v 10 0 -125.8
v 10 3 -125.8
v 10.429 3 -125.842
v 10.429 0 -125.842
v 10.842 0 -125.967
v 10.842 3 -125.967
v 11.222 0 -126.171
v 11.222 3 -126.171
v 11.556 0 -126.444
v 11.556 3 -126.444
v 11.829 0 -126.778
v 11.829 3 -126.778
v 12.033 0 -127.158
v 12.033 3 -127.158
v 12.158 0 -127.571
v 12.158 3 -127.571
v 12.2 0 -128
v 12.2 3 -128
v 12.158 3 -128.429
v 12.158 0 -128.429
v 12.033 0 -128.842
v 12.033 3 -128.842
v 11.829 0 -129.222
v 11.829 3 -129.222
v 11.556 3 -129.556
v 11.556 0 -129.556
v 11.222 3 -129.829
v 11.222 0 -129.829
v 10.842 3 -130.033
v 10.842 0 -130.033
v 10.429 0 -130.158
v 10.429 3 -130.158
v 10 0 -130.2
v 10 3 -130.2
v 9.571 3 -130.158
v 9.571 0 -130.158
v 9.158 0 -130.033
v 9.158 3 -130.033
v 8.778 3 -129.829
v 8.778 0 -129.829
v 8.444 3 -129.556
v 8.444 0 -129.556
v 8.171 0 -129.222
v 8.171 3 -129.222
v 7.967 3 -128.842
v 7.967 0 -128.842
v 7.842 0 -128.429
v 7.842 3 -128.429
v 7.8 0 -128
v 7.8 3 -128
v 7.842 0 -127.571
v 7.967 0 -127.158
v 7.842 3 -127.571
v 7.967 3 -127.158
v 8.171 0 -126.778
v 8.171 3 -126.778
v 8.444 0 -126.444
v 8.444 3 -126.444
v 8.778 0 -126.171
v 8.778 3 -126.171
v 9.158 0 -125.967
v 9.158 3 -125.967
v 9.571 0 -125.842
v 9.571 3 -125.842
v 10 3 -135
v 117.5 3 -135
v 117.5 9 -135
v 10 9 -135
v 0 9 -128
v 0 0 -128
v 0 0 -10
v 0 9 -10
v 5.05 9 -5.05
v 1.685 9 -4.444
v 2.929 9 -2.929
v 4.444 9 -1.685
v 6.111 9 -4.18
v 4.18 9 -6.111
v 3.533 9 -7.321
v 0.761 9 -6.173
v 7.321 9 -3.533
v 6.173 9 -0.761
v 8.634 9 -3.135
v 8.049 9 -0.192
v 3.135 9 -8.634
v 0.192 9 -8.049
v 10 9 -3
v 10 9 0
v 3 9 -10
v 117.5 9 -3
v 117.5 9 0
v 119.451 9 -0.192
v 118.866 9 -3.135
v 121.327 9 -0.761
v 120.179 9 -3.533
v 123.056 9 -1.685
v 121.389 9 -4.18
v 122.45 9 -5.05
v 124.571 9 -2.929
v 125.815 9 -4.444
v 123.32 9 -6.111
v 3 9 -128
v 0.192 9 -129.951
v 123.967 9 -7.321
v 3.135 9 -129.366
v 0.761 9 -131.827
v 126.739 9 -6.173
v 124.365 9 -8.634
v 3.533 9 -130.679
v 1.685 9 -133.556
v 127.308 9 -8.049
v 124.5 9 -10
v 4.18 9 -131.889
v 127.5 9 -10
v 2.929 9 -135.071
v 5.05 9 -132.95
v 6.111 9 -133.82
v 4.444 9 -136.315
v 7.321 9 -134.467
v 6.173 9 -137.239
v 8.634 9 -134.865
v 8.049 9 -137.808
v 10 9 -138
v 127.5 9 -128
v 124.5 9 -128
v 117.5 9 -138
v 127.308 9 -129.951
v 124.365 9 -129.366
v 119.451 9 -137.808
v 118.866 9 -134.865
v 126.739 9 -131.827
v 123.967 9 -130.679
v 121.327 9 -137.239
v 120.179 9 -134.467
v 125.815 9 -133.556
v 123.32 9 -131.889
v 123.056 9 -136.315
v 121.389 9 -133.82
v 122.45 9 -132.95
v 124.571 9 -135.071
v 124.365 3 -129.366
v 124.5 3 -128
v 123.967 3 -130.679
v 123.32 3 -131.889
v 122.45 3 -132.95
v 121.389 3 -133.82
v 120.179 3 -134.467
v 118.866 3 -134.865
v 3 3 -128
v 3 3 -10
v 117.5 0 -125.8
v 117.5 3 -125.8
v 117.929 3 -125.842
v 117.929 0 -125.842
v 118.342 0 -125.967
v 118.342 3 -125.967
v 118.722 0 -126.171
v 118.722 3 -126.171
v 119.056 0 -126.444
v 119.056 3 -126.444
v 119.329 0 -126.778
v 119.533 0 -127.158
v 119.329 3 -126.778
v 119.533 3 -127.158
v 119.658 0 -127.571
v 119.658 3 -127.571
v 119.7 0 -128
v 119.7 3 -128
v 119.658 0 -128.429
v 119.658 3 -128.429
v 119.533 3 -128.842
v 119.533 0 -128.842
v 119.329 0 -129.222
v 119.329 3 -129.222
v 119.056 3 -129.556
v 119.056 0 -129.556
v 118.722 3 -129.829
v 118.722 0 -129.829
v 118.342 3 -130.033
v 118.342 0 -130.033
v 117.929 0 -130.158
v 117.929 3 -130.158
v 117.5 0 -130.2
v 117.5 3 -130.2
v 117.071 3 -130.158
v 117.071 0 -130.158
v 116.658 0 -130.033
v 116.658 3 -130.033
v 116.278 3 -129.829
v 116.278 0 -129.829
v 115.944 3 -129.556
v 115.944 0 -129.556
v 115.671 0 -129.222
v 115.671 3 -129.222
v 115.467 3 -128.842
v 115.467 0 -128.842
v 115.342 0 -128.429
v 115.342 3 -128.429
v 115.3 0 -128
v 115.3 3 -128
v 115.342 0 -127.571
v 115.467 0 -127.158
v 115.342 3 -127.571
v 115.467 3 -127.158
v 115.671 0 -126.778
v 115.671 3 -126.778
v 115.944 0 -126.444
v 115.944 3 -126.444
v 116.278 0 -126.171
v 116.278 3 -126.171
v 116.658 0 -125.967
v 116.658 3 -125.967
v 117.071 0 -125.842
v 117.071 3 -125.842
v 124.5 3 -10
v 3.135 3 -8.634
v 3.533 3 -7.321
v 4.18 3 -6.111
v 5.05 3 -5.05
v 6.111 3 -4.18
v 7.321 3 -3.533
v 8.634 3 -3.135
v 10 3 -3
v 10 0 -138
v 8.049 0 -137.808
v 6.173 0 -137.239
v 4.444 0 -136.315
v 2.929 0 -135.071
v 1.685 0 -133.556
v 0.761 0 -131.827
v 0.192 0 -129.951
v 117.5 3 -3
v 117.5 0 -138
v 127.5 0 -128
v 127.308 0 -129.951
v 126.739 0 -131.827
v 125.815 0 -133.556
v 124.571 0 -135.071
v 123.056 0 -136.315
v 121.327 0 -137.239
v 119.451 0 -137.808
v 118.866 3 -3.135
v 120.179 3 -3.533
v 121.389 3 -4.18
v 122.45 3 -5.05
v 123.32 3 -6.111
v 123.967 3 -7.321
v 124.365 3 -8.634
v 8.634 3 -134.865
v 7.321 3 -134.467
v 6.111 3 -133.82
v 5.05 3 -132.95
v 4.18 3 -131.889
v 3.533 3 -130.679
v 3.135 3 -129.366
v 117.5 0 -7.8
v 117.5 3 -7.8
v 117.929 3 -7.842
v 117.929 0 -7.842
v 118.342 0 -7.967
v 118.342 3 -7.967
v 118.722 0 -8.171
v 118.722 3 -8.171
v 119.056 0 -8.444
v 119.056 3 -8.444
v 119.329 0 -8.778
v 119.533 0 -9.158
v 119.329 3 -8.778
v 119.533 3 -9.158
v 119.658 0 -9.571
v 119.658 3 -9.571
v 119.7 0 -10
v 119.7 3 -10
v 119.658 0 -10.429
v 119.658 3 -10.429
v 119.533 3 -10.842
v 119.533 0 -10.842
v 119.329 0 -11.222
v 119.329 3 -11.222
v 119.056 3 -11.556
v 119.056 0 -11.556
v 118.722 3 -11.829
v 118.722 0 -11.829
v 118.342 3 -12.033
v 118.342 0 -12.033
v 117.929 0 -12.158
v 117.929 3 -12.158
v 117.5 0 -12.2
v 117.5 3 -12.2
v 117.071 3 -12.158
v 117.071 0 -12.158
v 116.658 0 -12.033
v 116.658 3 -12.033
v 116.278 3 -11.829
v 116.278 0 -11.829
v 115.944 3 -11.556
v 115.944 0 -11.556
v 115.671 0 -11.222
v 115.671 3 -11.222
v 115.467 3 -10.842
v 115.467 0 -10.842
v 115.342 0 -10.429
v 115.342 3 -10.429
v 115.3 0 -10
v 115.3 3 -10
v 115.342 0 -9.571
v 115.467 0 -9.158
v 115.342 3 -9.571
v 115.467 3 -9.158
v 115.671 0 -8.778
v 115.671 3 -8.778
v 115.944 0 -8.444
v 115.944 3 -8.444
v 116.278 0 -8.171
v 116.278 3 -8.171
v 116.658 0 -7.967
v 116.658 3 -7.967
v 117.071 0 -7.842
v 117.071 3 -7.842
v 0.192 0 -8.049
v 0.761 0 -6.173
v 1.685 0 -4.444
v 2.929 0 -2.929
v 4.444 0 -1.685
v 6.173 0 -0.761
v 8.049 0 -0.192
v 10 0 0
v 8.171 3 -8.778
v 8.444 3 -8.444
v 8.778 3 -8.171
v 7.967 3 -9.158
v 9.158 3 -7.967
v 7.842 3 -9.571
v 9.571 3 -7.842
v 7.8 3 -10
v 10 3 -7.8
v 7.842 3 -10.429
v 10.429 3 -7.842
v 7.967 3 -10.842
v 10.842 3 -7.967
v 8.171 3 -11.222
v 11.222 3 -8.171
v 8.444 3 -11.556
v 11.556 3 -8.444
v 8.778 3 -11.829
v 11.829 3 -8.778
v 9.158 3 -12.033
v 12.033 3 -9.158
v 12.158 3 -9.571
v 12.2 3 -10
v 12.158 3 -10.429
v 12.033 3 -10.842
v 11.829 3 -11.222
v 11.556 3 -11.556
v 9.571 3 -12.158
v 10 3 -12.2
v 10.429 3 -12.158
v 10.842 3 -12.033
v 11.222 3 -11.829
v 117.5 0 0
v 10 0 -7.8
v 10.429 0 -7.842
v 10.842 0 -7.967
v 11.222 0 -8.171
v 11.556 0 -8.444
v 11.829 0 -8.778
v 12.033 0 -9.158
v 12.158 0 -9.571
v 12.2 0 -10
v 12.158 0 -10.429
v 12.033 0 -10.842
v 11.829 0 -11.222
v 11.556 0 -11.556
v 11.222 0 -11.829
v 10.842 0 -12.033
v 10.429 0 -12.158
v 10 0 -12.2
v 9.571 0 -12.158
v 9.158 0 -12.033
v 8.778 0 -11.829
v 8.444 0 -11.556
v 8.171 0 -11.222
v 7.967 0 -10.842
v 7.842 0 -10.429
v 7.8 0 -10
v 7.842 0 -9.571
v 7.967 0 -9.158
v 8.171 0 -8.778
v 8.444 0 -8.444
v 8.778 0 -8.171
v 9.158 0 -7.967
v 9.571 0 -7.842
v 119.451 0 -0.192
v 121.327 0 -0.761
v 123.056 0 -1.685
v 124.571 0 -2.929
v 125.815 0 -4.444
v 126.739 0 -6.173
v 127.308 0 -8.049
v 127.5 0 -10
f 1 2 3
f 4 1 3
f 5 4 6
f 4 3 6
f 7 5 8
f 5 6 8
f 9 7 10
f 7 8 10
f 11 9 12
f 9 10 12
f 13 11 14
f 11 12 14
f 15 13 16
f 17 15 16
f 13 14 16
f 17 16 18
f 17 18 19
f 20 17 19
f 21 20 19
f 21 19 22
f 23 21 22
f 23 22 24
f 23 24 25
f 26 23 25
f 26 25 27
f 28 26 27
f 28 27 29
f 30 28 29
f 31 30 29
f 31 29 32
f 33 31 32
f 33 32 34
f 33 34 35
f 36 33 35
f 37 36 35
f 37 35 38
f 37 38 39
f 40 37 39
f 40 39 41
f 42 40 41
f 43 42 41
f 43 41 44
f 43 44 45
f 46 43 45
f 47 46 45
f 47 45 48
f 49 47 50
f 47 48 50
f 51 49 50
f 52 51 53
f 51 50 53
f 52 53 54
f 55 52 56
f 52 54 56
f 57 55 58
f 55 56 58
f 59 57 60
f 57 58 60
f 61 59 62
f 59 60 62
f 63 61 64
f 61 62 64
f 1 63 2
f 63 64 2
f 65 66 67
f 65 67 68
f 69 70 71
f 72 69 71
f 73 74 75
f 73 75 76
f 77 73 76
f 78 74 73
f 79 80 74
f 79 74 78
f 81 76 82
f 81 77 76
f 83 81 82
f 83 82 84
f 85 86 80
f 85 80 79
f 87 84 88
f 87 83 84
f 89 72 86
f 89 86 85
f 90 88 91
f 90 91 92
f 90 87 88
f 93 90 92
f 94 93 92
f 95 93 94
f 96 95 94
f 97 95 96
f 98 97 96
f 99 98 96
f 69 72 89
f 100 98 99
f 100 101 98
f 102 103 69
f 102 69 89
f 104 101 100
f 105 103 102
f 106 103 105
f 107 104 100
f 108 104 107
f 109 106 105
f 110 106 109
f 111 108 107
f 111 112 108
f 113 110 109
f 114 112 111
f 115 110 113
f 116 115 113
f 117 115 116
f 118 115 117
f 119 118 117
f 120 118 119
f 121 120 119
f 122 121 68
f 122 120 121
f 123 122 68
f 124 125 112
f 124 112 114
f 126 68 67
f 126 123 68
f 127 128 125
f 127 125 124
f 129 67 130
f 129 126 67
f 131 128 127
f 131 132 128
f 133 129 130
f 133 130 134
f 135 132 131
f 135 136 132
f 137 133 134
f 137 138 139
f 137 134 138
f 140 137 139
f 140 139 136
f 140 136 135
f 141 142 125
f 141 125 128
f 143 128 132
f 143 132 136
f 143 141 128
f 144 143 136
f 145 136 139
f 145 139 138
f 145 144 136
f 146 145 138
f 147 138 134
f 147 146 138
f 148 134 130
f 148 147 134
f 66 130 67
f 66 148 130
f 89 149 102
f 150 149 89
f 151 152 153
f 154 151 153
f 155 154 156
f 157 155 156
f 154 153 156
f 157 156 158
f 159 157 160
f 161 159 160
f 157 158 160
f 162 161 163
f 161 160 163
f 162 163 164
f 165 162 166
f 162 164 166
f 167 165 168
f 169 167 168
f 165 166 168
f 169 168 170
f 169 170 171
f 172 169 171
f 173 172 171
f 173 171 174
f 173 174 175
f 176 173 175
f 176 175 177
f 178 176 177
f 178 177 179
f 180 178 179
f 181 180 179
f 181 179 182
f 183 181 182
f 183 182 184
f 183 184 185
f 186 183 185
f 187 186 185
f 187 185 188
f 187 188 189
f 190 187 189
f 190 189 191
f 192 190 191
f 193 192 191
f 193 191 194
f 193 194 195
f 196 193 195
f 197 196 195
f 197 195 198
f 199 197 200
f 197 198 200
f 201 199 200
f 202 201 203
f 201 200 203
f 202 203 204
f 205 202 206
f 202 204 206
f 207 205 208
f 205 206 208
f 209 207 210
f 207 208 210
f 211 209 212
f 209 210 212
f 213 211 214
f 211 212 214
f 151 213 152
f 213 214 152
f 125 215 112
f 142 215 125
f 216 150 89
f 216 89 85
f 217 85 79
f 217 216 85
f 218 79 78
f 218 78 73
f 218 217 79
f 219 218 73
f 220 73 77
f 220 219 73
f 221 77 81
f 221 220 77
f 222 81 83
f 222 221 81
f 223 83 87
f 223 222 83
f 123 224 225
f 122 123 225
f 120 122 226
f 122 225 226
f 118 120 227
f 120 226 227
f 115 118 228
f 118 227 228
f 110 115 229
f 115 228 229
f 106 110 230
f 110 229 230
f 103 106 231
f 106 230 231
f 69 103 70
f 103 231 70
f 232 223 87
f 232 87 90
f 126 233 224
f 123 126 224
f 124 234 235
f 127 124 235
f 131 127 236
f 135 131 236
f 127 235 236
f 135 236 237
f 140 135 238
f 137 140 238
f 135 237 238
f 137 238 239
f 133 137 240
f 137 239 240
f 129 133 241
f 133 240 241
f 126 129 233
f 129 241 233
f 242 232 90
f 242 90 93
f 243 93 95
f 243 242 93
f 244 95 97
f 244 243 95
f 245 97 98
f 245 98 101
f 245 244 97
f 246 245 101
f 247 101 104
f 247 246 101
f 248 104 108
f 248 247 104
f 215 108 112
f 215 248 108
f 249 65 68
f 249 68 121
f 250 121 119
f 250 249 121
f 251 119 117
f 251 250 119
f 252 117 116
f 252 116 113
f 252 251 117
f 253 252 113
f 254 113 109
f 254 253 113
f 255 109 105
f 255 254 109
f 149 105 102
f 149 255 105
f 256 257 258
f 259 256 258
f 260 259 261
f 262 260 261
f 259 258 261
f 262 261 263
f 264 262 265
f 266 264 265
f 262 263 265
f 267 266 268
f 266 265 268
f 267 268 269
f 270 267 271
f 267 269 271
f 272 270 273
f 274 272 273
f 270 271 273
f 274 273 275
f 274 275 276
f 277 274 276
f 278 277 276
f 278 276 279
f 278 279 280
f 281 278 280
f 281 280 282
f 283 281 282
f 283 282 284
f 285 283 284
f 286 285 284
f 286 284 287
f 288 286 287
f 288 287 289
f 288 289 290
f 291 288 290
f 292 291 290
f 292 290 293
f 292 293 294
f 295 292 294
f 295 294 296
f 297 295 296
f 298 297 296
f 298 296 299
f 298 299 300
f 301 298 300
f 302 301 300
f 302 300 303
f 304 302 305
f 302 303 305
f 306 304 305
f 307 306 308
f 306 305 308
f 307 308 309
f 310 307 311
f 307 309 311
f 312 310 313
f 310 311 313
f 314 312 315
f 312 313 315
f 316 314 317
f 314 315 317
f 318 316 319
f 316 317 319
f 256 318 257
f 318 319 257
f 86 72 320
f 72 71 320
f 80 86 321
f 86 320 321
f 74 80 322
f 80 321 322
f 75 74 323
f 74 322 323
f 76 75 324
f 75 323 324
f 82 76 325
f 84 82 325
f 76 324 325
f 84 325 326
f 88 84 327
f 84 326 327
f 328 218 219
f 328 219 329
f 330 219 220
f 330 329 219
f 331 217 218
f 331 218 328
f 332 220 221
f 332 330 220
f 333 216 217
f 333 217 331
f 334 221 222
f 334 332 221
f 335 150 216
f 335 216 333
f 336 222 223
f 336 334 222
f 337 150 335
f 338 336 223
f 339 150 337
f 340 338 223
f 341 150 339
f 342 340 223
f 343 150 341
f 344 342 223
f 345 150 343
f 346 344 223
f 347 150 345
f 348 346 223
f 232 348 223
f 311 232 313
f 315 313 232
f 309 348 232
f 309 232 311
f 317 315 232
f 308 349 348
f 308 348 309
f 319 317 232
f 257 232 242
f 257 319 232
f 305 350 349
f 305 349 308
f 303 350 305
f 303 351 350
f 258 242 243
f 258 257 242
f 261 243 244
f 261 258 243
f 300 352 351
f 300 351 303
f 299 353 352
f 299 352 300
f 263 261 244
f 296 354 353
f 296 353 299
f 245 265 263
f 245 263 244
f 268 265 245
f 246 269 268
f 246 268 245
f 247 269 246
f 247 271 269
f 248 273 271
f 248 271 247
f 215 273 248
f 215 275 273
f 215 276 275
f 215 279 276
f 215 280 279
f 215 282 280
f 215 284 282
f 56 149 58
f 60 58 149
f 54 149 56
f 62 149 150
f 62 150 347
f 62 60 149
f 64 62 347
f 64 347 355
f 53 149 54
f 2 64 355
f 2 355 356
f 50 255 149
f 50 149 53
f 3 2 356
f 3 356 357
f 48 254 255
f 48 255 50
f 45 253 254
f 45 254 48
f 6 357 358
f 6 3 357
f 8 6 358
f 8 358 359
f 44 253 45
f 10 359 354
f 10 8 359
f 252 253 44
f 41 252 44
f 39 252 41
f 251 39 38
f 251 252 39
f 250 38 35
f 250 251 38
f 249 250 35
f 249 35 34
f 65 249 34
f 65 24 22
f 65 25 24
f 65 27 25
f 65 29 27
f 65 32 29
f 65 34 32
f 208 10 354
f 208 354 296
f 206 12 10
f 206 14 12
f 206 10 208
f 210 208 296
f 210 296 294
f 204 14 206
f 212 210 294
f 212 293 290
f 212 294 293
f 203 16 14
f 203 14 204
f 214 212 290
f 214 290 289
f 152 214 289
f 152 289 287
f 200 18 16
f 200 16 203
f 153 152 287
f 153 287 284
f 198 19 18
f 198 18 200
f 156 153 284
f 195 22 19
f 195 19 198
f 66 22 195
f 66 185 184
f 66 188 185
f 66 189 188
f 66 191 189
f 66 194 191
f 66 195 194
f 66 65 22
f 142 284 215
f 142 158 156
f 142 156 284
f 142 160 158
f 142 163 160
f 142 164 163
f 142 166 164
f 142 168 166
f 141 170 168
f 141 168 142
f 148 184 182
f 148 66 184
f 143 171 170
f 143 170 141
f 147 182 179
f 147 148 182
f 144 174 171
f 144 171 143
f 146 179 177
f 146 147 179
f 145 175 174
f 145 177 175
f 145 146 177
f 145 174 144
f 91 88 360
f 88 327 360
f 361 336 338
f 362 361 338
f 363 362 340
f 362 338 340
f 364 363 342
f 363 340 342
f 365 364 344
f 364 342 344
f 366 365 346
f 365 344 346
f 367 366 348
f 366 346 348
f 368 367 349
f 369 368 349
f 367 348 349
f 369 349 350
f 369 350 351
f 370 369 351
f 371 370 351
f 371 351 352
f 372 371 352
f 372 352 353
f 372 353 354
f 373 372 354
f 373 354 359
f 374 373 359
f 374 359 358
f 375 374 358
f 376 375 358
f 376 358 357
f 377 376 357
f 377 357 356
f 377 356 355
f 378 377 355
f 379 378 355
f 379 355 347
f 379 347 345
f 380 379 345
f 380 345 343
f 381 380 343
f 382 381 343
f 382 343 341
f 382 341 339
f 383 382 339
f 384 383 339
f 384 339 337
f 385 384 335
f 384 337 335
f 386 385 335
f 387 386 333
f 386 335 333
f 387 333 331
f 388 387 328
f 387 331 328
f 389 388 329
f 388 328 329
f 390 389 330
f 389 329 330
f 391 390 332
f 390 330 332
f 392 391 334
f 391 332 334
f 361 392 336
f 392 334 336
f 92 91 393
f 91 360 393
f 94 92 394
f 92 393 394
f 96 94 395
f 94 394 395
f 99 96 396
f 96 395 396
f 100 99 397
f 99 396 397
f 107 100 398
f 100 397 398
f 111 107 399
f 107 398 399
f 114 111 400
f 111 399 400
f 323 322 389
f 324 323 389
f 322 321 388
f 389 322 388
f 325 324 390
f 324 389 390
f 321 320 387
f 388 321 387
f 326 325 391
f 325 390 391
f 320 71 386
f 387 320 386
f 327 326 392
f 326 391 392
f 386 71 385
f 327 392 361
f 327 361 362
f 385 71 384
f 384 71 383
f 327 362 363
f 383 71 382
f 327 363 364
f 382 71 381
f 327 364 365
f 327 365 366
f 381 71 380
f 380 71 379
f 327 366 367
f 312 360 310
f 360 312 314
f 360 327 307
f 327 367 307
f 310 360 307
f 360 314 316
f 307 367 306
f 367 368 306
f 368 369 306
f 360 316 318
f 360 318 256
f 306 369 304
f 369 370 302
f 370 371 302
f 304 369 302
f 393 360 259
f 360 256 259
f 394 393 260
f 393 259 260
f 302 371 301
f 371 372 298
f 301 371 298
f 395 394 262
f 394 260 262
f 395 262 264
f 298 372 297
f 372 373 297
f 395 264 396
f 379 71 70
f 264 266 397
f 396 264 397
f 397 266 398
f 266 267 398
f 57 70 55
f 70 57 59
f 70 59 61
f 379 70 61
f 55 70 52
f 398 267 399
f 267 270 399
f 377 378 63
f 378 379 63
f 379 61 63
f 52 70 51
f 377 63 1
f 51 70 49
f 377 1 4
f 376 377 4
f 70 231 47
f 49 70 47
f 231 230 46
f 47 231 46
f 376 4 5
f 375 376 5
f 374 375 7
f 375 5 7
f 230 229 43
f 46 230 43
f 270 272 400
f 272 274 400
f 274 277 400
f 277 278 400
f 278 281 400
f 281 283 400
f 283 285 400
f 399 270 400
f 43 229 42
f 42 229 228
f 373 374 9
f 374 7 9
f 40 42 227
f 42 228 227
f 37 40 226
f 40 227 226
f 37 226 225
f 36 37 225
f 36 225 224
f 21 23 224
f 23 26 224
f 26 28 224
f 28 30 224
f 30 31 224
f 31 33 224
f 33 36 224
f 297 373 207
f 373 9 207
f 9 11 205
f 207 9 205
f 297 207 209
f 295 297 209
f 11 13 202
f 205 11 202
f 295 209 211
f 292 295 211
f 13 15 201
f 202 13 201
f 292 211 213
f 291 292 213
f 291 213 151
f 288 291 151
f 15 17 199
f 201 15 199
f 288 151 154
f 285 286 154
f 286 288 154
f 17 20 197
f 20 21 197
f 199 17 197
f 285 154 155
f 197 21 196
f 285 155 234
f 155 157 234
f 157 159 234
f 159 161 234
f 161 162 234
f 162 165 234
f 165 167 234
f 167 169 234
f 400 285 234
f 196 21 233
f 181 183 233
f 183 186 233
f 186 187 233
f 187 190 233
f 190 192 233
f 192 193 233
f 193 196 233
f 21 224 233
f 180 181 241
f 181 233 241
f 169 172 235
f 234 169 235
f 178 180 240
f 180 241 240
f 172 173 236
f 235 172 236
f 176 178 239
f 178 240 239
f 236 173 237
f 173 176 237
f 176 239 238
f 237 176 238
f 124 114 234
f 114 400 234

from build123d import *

# Parameters (mm, degrees)
EXTRUDE_1_DEPTH     = 3
EXTRUDE_2_DEPTH     = 6
SKETCH_3_R          = 2.2
CUT_EXTRUDE_1_DEPTH = 188.979387168


with BuildPart() as part:
    # 草图1 → 凸台-拉伸1 (new body)
    with BuildSketch(Plane(origin=(0, 0, 0), x_dir=(1, 0, 0), z_dir=(0, 1, 0))):
        with BuildLine():
            Line((10, 0), (117.5, 0))
            ThreePointArc((117.5, 0), (124.571067812, 2.928932188), (127.5, 10))
            Line((127.5, 10), (127.5, 128))
            ThreePointArc((127.5, 128), (124.571067812, 135.071067812), (117.5, 138))
            Line((117.5, 138), (10, 138))
            ThreePointArc((10, 138), (2.928932188, 135.071067812), (0, 128))
            Line((0, 128), (0, 10))
            ThreePointArc((0, 10), (2.928932188, 2.928932188), (10, 0))
        make_face()
    extrude(amount=EXTRUDE_1_DEPTH)

    # 草图2 → 凸台-拉伸2 (add)
    with BuildSketch(Plane(origin=(0, 3, 0), x_dir=(1, 0, 0), z_dir=(0, 1, 0))):
        with BuildLine():
            Line((0, 128), (0, 10))
            ThreePointArc((0, 10), (2.928932188, 2.928932188), (10, 0))
            Line((10, 0), (117.5, 0))
            ThreePointArc((117.5, 0), (124.571067812, 2.928932188), (127.5, 10))
            Line((127.5, 10), (127.5, 128))
            ThreePointArc((127.5, 128), (124.571067812, 135.071067812), (117.5, 138))
            Line((117.5, 138), (10, 138))
            ThreePointArc((10, 138), (2.928932188, 135.071067812), (0, 128))
        make_face()
        with BuildLine():
            Line((117.5, 135), (10, 135))
            ThreePointArc((10, 135), (5.050252532, 132.949747468), (3, 128))
            Line((3, 128), (3, 10))
            ThreePointArc((3, 10), (5.050252532, 5.050252532), (10, 3))
            Line((10, 3), (117.5, 3))
            ThreePointArc((117.5, 3), (122.449747468, 5.050252532), (124.5, 10))
            Line((124.5, 10), (124.5, 128))
            ThreePointArc((124.5, 128), (122.449747468, 132.949747468), (117.5, 135))
        make_face(mode=Mode.SUBTRACT)
    extrude(amount=EXTRUDE_2_DEPTH)

    # 草图3 → 切除-拉伸1 (cut, through all)
    with BuildSketch(Plane(origin=(0, 3, 0), x_dir=(1, 0, 0), z_dir=(0, 1, 0))):
        with Locations(Location((10, 128, 0), (0, 0, 270))):
            Circle(SKETCH_3_R)
        with Locations(Location((117.5, 128, 0), (0, 0, 270))):
            Circle(SKETCH_3_R)
        with Locations(Location((10, 10, 0), (0, 0, 270))):
            Circle(SKETCH_3_R)
        with Locations(Location((117.5, 10, 0), (0, 0, 270))):
            Circle(SKETCH_3_R)
    extrude(amount=-CUT_EXTRUDE_1_DEPTH, mode=Mode.SUBTRACT)


solid = part.part
